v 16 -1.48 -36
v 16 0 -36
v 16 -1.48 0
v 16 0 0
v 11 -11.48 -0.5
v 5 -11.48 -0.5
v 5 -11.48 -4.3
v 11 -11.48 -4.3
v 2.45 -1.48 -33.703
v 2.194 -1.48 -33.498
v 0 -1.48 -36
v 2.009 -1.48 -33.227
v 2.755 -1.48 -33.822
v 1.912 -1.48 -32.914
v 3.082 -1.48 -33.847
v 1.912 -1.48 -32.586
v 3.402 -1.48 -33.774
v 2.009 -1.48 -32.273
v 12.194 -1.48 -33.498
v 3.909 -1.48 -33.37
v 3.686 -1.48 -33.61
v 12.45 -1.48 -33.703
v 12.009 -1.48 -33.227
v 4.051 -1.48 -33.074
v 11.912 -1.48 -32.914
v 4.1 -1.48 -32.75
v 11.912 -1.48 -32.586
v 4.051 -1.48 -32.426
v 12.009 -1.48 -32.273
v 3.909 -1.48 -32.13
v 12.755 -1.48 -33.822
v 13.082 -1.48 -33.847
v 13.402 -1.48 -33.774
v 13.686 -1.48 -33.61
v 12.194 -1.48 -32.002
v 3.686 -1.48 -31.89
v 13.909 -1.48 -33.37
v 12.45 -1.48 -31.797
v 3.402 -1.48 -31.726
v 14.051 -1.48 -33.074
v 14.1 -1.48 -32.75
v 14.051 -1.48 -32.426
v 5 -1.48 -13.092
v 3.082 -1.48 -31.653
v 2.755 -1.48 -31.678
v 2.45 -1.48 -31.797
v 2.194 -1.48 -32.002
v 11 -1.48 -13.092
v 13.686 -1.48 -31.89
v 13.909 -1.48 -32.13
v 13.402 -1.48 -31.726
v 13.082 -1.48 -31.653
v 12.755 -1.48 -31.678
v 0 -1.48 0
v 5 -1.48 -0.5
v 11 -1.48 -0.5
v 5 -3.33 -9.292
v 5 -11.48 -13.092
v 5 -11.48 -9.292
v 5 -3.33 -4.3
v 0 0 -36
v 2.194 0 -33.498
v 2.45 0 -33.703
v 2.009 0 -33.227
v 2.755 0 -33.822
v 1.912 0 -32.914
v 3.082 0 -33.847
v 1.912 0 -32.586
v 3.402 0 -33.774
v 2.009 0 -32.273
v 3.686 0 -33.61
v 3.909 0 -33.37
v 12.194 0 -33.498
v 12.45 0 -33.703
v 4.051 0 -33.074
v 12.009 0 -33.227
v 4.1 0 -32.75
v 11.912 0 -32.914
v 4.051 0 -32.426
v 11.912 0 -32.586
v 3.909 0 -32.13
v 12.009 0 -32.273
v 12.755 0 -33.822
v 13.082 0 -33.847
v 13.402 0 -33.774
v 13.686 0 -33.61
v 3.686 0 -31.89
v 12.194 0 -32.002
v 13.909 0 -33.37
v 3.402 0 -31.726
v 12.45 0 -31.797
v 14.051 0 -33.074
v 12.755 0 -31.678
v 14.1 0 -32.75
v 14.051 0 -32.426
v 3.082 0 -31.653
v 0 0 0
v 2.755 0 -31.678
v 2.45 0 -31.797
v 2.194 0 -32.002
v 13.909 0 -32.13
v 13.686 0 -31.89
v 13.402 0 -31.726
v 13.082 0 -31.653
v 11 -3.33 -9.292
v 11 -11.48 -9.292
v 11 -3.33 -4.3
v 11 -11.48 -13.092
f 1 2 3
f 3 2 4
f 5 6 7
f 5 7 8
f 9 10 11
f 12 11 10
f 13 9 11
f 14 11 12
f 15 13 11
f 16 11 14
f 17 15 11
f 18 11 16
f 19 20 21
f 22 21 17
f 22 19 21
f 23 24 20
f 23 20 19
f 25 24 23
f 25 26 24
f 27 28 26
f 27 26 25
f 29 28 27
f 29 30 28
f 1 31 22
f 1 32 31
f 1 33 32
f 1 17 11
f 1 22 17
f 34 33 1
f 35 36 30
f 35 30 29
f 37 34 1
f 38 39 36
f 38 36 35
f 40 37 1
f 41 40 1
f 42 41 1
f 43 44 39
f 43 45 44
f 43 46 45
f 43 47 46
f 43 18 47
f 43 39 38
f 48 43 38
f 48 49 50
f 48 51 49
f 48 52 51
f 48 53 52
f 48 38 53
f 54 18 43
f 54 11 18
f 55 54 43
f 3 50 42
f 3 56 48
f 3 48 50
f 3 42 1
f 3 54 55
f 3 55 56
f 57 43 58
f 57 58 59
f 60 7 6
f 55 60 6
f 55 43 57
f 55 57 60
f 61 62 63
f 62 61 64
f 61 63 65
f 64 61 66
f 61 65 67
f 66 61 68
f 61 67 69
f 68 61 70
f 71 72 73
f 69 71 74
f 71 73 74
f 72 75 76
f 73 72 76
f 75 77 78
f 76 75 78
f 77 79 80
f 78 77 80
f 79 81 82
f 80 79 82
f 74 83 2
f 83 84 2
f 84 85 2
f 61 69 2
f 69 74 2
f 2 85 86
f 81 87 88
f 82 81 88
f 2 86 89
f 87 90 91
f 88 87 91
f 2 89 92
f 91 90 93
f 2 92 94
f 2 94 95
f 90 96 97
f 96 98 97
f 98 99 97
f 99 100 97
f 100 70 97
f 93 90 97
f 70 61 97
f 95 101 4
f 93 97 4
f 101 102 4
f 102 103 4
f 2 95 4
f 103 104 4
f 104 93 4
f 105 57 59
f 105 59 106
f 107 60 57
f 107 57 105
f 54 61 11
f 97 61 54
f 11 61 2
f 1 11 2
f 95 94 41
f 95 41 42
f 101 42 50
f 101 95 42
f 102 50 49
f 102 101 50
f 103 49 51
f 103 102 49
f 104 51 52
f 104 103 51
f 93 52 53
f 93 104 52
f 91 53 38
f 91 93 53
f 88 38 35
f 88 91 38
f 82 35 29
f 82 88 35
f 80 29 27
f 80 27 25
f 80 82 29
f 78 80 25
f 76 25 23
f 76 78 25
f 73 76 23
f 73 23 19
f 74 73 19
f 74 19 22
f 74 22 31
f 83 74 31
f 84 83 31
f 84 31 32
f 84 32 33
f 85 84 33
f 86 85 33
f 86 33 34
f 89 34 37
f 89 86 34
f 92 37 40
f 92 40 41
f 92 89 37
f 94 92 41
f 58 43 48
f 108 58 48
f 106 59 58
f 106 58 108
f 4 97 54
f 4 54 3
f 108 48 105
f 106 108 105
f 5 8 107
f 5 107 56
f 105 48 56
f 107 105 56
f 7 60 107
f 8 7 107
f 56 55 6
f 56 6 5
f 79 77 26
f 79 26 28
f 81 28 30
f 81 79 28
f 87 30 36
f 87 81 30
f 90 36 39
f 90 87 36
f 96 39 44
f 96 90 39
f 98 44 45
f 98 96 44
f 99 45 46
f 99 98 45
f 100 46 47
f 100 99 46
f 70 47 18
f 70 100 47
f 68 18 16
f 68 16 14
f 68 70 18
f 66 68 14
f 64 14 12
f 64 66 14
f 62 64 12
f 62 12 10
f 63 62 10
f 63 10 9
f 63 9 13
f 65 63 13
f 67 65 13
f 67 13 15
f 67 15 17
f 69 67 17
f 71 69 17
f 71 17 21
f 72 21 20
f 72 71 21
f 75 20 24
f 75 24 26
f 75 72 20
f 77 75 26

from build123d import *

# Parameters (mm, degrees)
F0_W     = 16
F0_H     = 36
F0_R     = 1.1
F1_DEPTH = 1.47957
F3_W     = 6
F3_H     = 3.8
F4_DEPTH = 10
F3_H_2   = 4.992
F5_DEPTH = 1.85


with BuildPart() as f1:
    # F0 (on Front) → F1 (new body)
    with BuildSketch(Plane.XZ):
        with Locations((8, -18)):
            Rectangle(F0_W, F0_H)
        with Locations((3, -32.75)):
            Circle(F0_R, mode=Mode.SUBTRACT)
        with Locations((13, -32.75)):
            Circle(F0_R, mode=Mode.SUBTRACT)
    extrude(amount=F1_DEPTH)

    # F3 (on face) → F4 (join)
    with BuildSketch(Plane.XZ.offset(1.47957)):
        with Locations((8, -11.192)):
            Rectangle(F3_W, F3_H)
        with Locations((8, -2.4)):
            Rectangle(F3_W, F3_H)
    extrude(amount=F4_DEPTH)

    # F3 (on face) → F5 (join)
    with BuildSketch(Plane.XZ.offset(1.47957)):
        with Locations((8, -6.796)):
            Rectangle(F3_W, F3_H_2)
    extrude(amount=F5_DEPTH)


solid = f1.part
